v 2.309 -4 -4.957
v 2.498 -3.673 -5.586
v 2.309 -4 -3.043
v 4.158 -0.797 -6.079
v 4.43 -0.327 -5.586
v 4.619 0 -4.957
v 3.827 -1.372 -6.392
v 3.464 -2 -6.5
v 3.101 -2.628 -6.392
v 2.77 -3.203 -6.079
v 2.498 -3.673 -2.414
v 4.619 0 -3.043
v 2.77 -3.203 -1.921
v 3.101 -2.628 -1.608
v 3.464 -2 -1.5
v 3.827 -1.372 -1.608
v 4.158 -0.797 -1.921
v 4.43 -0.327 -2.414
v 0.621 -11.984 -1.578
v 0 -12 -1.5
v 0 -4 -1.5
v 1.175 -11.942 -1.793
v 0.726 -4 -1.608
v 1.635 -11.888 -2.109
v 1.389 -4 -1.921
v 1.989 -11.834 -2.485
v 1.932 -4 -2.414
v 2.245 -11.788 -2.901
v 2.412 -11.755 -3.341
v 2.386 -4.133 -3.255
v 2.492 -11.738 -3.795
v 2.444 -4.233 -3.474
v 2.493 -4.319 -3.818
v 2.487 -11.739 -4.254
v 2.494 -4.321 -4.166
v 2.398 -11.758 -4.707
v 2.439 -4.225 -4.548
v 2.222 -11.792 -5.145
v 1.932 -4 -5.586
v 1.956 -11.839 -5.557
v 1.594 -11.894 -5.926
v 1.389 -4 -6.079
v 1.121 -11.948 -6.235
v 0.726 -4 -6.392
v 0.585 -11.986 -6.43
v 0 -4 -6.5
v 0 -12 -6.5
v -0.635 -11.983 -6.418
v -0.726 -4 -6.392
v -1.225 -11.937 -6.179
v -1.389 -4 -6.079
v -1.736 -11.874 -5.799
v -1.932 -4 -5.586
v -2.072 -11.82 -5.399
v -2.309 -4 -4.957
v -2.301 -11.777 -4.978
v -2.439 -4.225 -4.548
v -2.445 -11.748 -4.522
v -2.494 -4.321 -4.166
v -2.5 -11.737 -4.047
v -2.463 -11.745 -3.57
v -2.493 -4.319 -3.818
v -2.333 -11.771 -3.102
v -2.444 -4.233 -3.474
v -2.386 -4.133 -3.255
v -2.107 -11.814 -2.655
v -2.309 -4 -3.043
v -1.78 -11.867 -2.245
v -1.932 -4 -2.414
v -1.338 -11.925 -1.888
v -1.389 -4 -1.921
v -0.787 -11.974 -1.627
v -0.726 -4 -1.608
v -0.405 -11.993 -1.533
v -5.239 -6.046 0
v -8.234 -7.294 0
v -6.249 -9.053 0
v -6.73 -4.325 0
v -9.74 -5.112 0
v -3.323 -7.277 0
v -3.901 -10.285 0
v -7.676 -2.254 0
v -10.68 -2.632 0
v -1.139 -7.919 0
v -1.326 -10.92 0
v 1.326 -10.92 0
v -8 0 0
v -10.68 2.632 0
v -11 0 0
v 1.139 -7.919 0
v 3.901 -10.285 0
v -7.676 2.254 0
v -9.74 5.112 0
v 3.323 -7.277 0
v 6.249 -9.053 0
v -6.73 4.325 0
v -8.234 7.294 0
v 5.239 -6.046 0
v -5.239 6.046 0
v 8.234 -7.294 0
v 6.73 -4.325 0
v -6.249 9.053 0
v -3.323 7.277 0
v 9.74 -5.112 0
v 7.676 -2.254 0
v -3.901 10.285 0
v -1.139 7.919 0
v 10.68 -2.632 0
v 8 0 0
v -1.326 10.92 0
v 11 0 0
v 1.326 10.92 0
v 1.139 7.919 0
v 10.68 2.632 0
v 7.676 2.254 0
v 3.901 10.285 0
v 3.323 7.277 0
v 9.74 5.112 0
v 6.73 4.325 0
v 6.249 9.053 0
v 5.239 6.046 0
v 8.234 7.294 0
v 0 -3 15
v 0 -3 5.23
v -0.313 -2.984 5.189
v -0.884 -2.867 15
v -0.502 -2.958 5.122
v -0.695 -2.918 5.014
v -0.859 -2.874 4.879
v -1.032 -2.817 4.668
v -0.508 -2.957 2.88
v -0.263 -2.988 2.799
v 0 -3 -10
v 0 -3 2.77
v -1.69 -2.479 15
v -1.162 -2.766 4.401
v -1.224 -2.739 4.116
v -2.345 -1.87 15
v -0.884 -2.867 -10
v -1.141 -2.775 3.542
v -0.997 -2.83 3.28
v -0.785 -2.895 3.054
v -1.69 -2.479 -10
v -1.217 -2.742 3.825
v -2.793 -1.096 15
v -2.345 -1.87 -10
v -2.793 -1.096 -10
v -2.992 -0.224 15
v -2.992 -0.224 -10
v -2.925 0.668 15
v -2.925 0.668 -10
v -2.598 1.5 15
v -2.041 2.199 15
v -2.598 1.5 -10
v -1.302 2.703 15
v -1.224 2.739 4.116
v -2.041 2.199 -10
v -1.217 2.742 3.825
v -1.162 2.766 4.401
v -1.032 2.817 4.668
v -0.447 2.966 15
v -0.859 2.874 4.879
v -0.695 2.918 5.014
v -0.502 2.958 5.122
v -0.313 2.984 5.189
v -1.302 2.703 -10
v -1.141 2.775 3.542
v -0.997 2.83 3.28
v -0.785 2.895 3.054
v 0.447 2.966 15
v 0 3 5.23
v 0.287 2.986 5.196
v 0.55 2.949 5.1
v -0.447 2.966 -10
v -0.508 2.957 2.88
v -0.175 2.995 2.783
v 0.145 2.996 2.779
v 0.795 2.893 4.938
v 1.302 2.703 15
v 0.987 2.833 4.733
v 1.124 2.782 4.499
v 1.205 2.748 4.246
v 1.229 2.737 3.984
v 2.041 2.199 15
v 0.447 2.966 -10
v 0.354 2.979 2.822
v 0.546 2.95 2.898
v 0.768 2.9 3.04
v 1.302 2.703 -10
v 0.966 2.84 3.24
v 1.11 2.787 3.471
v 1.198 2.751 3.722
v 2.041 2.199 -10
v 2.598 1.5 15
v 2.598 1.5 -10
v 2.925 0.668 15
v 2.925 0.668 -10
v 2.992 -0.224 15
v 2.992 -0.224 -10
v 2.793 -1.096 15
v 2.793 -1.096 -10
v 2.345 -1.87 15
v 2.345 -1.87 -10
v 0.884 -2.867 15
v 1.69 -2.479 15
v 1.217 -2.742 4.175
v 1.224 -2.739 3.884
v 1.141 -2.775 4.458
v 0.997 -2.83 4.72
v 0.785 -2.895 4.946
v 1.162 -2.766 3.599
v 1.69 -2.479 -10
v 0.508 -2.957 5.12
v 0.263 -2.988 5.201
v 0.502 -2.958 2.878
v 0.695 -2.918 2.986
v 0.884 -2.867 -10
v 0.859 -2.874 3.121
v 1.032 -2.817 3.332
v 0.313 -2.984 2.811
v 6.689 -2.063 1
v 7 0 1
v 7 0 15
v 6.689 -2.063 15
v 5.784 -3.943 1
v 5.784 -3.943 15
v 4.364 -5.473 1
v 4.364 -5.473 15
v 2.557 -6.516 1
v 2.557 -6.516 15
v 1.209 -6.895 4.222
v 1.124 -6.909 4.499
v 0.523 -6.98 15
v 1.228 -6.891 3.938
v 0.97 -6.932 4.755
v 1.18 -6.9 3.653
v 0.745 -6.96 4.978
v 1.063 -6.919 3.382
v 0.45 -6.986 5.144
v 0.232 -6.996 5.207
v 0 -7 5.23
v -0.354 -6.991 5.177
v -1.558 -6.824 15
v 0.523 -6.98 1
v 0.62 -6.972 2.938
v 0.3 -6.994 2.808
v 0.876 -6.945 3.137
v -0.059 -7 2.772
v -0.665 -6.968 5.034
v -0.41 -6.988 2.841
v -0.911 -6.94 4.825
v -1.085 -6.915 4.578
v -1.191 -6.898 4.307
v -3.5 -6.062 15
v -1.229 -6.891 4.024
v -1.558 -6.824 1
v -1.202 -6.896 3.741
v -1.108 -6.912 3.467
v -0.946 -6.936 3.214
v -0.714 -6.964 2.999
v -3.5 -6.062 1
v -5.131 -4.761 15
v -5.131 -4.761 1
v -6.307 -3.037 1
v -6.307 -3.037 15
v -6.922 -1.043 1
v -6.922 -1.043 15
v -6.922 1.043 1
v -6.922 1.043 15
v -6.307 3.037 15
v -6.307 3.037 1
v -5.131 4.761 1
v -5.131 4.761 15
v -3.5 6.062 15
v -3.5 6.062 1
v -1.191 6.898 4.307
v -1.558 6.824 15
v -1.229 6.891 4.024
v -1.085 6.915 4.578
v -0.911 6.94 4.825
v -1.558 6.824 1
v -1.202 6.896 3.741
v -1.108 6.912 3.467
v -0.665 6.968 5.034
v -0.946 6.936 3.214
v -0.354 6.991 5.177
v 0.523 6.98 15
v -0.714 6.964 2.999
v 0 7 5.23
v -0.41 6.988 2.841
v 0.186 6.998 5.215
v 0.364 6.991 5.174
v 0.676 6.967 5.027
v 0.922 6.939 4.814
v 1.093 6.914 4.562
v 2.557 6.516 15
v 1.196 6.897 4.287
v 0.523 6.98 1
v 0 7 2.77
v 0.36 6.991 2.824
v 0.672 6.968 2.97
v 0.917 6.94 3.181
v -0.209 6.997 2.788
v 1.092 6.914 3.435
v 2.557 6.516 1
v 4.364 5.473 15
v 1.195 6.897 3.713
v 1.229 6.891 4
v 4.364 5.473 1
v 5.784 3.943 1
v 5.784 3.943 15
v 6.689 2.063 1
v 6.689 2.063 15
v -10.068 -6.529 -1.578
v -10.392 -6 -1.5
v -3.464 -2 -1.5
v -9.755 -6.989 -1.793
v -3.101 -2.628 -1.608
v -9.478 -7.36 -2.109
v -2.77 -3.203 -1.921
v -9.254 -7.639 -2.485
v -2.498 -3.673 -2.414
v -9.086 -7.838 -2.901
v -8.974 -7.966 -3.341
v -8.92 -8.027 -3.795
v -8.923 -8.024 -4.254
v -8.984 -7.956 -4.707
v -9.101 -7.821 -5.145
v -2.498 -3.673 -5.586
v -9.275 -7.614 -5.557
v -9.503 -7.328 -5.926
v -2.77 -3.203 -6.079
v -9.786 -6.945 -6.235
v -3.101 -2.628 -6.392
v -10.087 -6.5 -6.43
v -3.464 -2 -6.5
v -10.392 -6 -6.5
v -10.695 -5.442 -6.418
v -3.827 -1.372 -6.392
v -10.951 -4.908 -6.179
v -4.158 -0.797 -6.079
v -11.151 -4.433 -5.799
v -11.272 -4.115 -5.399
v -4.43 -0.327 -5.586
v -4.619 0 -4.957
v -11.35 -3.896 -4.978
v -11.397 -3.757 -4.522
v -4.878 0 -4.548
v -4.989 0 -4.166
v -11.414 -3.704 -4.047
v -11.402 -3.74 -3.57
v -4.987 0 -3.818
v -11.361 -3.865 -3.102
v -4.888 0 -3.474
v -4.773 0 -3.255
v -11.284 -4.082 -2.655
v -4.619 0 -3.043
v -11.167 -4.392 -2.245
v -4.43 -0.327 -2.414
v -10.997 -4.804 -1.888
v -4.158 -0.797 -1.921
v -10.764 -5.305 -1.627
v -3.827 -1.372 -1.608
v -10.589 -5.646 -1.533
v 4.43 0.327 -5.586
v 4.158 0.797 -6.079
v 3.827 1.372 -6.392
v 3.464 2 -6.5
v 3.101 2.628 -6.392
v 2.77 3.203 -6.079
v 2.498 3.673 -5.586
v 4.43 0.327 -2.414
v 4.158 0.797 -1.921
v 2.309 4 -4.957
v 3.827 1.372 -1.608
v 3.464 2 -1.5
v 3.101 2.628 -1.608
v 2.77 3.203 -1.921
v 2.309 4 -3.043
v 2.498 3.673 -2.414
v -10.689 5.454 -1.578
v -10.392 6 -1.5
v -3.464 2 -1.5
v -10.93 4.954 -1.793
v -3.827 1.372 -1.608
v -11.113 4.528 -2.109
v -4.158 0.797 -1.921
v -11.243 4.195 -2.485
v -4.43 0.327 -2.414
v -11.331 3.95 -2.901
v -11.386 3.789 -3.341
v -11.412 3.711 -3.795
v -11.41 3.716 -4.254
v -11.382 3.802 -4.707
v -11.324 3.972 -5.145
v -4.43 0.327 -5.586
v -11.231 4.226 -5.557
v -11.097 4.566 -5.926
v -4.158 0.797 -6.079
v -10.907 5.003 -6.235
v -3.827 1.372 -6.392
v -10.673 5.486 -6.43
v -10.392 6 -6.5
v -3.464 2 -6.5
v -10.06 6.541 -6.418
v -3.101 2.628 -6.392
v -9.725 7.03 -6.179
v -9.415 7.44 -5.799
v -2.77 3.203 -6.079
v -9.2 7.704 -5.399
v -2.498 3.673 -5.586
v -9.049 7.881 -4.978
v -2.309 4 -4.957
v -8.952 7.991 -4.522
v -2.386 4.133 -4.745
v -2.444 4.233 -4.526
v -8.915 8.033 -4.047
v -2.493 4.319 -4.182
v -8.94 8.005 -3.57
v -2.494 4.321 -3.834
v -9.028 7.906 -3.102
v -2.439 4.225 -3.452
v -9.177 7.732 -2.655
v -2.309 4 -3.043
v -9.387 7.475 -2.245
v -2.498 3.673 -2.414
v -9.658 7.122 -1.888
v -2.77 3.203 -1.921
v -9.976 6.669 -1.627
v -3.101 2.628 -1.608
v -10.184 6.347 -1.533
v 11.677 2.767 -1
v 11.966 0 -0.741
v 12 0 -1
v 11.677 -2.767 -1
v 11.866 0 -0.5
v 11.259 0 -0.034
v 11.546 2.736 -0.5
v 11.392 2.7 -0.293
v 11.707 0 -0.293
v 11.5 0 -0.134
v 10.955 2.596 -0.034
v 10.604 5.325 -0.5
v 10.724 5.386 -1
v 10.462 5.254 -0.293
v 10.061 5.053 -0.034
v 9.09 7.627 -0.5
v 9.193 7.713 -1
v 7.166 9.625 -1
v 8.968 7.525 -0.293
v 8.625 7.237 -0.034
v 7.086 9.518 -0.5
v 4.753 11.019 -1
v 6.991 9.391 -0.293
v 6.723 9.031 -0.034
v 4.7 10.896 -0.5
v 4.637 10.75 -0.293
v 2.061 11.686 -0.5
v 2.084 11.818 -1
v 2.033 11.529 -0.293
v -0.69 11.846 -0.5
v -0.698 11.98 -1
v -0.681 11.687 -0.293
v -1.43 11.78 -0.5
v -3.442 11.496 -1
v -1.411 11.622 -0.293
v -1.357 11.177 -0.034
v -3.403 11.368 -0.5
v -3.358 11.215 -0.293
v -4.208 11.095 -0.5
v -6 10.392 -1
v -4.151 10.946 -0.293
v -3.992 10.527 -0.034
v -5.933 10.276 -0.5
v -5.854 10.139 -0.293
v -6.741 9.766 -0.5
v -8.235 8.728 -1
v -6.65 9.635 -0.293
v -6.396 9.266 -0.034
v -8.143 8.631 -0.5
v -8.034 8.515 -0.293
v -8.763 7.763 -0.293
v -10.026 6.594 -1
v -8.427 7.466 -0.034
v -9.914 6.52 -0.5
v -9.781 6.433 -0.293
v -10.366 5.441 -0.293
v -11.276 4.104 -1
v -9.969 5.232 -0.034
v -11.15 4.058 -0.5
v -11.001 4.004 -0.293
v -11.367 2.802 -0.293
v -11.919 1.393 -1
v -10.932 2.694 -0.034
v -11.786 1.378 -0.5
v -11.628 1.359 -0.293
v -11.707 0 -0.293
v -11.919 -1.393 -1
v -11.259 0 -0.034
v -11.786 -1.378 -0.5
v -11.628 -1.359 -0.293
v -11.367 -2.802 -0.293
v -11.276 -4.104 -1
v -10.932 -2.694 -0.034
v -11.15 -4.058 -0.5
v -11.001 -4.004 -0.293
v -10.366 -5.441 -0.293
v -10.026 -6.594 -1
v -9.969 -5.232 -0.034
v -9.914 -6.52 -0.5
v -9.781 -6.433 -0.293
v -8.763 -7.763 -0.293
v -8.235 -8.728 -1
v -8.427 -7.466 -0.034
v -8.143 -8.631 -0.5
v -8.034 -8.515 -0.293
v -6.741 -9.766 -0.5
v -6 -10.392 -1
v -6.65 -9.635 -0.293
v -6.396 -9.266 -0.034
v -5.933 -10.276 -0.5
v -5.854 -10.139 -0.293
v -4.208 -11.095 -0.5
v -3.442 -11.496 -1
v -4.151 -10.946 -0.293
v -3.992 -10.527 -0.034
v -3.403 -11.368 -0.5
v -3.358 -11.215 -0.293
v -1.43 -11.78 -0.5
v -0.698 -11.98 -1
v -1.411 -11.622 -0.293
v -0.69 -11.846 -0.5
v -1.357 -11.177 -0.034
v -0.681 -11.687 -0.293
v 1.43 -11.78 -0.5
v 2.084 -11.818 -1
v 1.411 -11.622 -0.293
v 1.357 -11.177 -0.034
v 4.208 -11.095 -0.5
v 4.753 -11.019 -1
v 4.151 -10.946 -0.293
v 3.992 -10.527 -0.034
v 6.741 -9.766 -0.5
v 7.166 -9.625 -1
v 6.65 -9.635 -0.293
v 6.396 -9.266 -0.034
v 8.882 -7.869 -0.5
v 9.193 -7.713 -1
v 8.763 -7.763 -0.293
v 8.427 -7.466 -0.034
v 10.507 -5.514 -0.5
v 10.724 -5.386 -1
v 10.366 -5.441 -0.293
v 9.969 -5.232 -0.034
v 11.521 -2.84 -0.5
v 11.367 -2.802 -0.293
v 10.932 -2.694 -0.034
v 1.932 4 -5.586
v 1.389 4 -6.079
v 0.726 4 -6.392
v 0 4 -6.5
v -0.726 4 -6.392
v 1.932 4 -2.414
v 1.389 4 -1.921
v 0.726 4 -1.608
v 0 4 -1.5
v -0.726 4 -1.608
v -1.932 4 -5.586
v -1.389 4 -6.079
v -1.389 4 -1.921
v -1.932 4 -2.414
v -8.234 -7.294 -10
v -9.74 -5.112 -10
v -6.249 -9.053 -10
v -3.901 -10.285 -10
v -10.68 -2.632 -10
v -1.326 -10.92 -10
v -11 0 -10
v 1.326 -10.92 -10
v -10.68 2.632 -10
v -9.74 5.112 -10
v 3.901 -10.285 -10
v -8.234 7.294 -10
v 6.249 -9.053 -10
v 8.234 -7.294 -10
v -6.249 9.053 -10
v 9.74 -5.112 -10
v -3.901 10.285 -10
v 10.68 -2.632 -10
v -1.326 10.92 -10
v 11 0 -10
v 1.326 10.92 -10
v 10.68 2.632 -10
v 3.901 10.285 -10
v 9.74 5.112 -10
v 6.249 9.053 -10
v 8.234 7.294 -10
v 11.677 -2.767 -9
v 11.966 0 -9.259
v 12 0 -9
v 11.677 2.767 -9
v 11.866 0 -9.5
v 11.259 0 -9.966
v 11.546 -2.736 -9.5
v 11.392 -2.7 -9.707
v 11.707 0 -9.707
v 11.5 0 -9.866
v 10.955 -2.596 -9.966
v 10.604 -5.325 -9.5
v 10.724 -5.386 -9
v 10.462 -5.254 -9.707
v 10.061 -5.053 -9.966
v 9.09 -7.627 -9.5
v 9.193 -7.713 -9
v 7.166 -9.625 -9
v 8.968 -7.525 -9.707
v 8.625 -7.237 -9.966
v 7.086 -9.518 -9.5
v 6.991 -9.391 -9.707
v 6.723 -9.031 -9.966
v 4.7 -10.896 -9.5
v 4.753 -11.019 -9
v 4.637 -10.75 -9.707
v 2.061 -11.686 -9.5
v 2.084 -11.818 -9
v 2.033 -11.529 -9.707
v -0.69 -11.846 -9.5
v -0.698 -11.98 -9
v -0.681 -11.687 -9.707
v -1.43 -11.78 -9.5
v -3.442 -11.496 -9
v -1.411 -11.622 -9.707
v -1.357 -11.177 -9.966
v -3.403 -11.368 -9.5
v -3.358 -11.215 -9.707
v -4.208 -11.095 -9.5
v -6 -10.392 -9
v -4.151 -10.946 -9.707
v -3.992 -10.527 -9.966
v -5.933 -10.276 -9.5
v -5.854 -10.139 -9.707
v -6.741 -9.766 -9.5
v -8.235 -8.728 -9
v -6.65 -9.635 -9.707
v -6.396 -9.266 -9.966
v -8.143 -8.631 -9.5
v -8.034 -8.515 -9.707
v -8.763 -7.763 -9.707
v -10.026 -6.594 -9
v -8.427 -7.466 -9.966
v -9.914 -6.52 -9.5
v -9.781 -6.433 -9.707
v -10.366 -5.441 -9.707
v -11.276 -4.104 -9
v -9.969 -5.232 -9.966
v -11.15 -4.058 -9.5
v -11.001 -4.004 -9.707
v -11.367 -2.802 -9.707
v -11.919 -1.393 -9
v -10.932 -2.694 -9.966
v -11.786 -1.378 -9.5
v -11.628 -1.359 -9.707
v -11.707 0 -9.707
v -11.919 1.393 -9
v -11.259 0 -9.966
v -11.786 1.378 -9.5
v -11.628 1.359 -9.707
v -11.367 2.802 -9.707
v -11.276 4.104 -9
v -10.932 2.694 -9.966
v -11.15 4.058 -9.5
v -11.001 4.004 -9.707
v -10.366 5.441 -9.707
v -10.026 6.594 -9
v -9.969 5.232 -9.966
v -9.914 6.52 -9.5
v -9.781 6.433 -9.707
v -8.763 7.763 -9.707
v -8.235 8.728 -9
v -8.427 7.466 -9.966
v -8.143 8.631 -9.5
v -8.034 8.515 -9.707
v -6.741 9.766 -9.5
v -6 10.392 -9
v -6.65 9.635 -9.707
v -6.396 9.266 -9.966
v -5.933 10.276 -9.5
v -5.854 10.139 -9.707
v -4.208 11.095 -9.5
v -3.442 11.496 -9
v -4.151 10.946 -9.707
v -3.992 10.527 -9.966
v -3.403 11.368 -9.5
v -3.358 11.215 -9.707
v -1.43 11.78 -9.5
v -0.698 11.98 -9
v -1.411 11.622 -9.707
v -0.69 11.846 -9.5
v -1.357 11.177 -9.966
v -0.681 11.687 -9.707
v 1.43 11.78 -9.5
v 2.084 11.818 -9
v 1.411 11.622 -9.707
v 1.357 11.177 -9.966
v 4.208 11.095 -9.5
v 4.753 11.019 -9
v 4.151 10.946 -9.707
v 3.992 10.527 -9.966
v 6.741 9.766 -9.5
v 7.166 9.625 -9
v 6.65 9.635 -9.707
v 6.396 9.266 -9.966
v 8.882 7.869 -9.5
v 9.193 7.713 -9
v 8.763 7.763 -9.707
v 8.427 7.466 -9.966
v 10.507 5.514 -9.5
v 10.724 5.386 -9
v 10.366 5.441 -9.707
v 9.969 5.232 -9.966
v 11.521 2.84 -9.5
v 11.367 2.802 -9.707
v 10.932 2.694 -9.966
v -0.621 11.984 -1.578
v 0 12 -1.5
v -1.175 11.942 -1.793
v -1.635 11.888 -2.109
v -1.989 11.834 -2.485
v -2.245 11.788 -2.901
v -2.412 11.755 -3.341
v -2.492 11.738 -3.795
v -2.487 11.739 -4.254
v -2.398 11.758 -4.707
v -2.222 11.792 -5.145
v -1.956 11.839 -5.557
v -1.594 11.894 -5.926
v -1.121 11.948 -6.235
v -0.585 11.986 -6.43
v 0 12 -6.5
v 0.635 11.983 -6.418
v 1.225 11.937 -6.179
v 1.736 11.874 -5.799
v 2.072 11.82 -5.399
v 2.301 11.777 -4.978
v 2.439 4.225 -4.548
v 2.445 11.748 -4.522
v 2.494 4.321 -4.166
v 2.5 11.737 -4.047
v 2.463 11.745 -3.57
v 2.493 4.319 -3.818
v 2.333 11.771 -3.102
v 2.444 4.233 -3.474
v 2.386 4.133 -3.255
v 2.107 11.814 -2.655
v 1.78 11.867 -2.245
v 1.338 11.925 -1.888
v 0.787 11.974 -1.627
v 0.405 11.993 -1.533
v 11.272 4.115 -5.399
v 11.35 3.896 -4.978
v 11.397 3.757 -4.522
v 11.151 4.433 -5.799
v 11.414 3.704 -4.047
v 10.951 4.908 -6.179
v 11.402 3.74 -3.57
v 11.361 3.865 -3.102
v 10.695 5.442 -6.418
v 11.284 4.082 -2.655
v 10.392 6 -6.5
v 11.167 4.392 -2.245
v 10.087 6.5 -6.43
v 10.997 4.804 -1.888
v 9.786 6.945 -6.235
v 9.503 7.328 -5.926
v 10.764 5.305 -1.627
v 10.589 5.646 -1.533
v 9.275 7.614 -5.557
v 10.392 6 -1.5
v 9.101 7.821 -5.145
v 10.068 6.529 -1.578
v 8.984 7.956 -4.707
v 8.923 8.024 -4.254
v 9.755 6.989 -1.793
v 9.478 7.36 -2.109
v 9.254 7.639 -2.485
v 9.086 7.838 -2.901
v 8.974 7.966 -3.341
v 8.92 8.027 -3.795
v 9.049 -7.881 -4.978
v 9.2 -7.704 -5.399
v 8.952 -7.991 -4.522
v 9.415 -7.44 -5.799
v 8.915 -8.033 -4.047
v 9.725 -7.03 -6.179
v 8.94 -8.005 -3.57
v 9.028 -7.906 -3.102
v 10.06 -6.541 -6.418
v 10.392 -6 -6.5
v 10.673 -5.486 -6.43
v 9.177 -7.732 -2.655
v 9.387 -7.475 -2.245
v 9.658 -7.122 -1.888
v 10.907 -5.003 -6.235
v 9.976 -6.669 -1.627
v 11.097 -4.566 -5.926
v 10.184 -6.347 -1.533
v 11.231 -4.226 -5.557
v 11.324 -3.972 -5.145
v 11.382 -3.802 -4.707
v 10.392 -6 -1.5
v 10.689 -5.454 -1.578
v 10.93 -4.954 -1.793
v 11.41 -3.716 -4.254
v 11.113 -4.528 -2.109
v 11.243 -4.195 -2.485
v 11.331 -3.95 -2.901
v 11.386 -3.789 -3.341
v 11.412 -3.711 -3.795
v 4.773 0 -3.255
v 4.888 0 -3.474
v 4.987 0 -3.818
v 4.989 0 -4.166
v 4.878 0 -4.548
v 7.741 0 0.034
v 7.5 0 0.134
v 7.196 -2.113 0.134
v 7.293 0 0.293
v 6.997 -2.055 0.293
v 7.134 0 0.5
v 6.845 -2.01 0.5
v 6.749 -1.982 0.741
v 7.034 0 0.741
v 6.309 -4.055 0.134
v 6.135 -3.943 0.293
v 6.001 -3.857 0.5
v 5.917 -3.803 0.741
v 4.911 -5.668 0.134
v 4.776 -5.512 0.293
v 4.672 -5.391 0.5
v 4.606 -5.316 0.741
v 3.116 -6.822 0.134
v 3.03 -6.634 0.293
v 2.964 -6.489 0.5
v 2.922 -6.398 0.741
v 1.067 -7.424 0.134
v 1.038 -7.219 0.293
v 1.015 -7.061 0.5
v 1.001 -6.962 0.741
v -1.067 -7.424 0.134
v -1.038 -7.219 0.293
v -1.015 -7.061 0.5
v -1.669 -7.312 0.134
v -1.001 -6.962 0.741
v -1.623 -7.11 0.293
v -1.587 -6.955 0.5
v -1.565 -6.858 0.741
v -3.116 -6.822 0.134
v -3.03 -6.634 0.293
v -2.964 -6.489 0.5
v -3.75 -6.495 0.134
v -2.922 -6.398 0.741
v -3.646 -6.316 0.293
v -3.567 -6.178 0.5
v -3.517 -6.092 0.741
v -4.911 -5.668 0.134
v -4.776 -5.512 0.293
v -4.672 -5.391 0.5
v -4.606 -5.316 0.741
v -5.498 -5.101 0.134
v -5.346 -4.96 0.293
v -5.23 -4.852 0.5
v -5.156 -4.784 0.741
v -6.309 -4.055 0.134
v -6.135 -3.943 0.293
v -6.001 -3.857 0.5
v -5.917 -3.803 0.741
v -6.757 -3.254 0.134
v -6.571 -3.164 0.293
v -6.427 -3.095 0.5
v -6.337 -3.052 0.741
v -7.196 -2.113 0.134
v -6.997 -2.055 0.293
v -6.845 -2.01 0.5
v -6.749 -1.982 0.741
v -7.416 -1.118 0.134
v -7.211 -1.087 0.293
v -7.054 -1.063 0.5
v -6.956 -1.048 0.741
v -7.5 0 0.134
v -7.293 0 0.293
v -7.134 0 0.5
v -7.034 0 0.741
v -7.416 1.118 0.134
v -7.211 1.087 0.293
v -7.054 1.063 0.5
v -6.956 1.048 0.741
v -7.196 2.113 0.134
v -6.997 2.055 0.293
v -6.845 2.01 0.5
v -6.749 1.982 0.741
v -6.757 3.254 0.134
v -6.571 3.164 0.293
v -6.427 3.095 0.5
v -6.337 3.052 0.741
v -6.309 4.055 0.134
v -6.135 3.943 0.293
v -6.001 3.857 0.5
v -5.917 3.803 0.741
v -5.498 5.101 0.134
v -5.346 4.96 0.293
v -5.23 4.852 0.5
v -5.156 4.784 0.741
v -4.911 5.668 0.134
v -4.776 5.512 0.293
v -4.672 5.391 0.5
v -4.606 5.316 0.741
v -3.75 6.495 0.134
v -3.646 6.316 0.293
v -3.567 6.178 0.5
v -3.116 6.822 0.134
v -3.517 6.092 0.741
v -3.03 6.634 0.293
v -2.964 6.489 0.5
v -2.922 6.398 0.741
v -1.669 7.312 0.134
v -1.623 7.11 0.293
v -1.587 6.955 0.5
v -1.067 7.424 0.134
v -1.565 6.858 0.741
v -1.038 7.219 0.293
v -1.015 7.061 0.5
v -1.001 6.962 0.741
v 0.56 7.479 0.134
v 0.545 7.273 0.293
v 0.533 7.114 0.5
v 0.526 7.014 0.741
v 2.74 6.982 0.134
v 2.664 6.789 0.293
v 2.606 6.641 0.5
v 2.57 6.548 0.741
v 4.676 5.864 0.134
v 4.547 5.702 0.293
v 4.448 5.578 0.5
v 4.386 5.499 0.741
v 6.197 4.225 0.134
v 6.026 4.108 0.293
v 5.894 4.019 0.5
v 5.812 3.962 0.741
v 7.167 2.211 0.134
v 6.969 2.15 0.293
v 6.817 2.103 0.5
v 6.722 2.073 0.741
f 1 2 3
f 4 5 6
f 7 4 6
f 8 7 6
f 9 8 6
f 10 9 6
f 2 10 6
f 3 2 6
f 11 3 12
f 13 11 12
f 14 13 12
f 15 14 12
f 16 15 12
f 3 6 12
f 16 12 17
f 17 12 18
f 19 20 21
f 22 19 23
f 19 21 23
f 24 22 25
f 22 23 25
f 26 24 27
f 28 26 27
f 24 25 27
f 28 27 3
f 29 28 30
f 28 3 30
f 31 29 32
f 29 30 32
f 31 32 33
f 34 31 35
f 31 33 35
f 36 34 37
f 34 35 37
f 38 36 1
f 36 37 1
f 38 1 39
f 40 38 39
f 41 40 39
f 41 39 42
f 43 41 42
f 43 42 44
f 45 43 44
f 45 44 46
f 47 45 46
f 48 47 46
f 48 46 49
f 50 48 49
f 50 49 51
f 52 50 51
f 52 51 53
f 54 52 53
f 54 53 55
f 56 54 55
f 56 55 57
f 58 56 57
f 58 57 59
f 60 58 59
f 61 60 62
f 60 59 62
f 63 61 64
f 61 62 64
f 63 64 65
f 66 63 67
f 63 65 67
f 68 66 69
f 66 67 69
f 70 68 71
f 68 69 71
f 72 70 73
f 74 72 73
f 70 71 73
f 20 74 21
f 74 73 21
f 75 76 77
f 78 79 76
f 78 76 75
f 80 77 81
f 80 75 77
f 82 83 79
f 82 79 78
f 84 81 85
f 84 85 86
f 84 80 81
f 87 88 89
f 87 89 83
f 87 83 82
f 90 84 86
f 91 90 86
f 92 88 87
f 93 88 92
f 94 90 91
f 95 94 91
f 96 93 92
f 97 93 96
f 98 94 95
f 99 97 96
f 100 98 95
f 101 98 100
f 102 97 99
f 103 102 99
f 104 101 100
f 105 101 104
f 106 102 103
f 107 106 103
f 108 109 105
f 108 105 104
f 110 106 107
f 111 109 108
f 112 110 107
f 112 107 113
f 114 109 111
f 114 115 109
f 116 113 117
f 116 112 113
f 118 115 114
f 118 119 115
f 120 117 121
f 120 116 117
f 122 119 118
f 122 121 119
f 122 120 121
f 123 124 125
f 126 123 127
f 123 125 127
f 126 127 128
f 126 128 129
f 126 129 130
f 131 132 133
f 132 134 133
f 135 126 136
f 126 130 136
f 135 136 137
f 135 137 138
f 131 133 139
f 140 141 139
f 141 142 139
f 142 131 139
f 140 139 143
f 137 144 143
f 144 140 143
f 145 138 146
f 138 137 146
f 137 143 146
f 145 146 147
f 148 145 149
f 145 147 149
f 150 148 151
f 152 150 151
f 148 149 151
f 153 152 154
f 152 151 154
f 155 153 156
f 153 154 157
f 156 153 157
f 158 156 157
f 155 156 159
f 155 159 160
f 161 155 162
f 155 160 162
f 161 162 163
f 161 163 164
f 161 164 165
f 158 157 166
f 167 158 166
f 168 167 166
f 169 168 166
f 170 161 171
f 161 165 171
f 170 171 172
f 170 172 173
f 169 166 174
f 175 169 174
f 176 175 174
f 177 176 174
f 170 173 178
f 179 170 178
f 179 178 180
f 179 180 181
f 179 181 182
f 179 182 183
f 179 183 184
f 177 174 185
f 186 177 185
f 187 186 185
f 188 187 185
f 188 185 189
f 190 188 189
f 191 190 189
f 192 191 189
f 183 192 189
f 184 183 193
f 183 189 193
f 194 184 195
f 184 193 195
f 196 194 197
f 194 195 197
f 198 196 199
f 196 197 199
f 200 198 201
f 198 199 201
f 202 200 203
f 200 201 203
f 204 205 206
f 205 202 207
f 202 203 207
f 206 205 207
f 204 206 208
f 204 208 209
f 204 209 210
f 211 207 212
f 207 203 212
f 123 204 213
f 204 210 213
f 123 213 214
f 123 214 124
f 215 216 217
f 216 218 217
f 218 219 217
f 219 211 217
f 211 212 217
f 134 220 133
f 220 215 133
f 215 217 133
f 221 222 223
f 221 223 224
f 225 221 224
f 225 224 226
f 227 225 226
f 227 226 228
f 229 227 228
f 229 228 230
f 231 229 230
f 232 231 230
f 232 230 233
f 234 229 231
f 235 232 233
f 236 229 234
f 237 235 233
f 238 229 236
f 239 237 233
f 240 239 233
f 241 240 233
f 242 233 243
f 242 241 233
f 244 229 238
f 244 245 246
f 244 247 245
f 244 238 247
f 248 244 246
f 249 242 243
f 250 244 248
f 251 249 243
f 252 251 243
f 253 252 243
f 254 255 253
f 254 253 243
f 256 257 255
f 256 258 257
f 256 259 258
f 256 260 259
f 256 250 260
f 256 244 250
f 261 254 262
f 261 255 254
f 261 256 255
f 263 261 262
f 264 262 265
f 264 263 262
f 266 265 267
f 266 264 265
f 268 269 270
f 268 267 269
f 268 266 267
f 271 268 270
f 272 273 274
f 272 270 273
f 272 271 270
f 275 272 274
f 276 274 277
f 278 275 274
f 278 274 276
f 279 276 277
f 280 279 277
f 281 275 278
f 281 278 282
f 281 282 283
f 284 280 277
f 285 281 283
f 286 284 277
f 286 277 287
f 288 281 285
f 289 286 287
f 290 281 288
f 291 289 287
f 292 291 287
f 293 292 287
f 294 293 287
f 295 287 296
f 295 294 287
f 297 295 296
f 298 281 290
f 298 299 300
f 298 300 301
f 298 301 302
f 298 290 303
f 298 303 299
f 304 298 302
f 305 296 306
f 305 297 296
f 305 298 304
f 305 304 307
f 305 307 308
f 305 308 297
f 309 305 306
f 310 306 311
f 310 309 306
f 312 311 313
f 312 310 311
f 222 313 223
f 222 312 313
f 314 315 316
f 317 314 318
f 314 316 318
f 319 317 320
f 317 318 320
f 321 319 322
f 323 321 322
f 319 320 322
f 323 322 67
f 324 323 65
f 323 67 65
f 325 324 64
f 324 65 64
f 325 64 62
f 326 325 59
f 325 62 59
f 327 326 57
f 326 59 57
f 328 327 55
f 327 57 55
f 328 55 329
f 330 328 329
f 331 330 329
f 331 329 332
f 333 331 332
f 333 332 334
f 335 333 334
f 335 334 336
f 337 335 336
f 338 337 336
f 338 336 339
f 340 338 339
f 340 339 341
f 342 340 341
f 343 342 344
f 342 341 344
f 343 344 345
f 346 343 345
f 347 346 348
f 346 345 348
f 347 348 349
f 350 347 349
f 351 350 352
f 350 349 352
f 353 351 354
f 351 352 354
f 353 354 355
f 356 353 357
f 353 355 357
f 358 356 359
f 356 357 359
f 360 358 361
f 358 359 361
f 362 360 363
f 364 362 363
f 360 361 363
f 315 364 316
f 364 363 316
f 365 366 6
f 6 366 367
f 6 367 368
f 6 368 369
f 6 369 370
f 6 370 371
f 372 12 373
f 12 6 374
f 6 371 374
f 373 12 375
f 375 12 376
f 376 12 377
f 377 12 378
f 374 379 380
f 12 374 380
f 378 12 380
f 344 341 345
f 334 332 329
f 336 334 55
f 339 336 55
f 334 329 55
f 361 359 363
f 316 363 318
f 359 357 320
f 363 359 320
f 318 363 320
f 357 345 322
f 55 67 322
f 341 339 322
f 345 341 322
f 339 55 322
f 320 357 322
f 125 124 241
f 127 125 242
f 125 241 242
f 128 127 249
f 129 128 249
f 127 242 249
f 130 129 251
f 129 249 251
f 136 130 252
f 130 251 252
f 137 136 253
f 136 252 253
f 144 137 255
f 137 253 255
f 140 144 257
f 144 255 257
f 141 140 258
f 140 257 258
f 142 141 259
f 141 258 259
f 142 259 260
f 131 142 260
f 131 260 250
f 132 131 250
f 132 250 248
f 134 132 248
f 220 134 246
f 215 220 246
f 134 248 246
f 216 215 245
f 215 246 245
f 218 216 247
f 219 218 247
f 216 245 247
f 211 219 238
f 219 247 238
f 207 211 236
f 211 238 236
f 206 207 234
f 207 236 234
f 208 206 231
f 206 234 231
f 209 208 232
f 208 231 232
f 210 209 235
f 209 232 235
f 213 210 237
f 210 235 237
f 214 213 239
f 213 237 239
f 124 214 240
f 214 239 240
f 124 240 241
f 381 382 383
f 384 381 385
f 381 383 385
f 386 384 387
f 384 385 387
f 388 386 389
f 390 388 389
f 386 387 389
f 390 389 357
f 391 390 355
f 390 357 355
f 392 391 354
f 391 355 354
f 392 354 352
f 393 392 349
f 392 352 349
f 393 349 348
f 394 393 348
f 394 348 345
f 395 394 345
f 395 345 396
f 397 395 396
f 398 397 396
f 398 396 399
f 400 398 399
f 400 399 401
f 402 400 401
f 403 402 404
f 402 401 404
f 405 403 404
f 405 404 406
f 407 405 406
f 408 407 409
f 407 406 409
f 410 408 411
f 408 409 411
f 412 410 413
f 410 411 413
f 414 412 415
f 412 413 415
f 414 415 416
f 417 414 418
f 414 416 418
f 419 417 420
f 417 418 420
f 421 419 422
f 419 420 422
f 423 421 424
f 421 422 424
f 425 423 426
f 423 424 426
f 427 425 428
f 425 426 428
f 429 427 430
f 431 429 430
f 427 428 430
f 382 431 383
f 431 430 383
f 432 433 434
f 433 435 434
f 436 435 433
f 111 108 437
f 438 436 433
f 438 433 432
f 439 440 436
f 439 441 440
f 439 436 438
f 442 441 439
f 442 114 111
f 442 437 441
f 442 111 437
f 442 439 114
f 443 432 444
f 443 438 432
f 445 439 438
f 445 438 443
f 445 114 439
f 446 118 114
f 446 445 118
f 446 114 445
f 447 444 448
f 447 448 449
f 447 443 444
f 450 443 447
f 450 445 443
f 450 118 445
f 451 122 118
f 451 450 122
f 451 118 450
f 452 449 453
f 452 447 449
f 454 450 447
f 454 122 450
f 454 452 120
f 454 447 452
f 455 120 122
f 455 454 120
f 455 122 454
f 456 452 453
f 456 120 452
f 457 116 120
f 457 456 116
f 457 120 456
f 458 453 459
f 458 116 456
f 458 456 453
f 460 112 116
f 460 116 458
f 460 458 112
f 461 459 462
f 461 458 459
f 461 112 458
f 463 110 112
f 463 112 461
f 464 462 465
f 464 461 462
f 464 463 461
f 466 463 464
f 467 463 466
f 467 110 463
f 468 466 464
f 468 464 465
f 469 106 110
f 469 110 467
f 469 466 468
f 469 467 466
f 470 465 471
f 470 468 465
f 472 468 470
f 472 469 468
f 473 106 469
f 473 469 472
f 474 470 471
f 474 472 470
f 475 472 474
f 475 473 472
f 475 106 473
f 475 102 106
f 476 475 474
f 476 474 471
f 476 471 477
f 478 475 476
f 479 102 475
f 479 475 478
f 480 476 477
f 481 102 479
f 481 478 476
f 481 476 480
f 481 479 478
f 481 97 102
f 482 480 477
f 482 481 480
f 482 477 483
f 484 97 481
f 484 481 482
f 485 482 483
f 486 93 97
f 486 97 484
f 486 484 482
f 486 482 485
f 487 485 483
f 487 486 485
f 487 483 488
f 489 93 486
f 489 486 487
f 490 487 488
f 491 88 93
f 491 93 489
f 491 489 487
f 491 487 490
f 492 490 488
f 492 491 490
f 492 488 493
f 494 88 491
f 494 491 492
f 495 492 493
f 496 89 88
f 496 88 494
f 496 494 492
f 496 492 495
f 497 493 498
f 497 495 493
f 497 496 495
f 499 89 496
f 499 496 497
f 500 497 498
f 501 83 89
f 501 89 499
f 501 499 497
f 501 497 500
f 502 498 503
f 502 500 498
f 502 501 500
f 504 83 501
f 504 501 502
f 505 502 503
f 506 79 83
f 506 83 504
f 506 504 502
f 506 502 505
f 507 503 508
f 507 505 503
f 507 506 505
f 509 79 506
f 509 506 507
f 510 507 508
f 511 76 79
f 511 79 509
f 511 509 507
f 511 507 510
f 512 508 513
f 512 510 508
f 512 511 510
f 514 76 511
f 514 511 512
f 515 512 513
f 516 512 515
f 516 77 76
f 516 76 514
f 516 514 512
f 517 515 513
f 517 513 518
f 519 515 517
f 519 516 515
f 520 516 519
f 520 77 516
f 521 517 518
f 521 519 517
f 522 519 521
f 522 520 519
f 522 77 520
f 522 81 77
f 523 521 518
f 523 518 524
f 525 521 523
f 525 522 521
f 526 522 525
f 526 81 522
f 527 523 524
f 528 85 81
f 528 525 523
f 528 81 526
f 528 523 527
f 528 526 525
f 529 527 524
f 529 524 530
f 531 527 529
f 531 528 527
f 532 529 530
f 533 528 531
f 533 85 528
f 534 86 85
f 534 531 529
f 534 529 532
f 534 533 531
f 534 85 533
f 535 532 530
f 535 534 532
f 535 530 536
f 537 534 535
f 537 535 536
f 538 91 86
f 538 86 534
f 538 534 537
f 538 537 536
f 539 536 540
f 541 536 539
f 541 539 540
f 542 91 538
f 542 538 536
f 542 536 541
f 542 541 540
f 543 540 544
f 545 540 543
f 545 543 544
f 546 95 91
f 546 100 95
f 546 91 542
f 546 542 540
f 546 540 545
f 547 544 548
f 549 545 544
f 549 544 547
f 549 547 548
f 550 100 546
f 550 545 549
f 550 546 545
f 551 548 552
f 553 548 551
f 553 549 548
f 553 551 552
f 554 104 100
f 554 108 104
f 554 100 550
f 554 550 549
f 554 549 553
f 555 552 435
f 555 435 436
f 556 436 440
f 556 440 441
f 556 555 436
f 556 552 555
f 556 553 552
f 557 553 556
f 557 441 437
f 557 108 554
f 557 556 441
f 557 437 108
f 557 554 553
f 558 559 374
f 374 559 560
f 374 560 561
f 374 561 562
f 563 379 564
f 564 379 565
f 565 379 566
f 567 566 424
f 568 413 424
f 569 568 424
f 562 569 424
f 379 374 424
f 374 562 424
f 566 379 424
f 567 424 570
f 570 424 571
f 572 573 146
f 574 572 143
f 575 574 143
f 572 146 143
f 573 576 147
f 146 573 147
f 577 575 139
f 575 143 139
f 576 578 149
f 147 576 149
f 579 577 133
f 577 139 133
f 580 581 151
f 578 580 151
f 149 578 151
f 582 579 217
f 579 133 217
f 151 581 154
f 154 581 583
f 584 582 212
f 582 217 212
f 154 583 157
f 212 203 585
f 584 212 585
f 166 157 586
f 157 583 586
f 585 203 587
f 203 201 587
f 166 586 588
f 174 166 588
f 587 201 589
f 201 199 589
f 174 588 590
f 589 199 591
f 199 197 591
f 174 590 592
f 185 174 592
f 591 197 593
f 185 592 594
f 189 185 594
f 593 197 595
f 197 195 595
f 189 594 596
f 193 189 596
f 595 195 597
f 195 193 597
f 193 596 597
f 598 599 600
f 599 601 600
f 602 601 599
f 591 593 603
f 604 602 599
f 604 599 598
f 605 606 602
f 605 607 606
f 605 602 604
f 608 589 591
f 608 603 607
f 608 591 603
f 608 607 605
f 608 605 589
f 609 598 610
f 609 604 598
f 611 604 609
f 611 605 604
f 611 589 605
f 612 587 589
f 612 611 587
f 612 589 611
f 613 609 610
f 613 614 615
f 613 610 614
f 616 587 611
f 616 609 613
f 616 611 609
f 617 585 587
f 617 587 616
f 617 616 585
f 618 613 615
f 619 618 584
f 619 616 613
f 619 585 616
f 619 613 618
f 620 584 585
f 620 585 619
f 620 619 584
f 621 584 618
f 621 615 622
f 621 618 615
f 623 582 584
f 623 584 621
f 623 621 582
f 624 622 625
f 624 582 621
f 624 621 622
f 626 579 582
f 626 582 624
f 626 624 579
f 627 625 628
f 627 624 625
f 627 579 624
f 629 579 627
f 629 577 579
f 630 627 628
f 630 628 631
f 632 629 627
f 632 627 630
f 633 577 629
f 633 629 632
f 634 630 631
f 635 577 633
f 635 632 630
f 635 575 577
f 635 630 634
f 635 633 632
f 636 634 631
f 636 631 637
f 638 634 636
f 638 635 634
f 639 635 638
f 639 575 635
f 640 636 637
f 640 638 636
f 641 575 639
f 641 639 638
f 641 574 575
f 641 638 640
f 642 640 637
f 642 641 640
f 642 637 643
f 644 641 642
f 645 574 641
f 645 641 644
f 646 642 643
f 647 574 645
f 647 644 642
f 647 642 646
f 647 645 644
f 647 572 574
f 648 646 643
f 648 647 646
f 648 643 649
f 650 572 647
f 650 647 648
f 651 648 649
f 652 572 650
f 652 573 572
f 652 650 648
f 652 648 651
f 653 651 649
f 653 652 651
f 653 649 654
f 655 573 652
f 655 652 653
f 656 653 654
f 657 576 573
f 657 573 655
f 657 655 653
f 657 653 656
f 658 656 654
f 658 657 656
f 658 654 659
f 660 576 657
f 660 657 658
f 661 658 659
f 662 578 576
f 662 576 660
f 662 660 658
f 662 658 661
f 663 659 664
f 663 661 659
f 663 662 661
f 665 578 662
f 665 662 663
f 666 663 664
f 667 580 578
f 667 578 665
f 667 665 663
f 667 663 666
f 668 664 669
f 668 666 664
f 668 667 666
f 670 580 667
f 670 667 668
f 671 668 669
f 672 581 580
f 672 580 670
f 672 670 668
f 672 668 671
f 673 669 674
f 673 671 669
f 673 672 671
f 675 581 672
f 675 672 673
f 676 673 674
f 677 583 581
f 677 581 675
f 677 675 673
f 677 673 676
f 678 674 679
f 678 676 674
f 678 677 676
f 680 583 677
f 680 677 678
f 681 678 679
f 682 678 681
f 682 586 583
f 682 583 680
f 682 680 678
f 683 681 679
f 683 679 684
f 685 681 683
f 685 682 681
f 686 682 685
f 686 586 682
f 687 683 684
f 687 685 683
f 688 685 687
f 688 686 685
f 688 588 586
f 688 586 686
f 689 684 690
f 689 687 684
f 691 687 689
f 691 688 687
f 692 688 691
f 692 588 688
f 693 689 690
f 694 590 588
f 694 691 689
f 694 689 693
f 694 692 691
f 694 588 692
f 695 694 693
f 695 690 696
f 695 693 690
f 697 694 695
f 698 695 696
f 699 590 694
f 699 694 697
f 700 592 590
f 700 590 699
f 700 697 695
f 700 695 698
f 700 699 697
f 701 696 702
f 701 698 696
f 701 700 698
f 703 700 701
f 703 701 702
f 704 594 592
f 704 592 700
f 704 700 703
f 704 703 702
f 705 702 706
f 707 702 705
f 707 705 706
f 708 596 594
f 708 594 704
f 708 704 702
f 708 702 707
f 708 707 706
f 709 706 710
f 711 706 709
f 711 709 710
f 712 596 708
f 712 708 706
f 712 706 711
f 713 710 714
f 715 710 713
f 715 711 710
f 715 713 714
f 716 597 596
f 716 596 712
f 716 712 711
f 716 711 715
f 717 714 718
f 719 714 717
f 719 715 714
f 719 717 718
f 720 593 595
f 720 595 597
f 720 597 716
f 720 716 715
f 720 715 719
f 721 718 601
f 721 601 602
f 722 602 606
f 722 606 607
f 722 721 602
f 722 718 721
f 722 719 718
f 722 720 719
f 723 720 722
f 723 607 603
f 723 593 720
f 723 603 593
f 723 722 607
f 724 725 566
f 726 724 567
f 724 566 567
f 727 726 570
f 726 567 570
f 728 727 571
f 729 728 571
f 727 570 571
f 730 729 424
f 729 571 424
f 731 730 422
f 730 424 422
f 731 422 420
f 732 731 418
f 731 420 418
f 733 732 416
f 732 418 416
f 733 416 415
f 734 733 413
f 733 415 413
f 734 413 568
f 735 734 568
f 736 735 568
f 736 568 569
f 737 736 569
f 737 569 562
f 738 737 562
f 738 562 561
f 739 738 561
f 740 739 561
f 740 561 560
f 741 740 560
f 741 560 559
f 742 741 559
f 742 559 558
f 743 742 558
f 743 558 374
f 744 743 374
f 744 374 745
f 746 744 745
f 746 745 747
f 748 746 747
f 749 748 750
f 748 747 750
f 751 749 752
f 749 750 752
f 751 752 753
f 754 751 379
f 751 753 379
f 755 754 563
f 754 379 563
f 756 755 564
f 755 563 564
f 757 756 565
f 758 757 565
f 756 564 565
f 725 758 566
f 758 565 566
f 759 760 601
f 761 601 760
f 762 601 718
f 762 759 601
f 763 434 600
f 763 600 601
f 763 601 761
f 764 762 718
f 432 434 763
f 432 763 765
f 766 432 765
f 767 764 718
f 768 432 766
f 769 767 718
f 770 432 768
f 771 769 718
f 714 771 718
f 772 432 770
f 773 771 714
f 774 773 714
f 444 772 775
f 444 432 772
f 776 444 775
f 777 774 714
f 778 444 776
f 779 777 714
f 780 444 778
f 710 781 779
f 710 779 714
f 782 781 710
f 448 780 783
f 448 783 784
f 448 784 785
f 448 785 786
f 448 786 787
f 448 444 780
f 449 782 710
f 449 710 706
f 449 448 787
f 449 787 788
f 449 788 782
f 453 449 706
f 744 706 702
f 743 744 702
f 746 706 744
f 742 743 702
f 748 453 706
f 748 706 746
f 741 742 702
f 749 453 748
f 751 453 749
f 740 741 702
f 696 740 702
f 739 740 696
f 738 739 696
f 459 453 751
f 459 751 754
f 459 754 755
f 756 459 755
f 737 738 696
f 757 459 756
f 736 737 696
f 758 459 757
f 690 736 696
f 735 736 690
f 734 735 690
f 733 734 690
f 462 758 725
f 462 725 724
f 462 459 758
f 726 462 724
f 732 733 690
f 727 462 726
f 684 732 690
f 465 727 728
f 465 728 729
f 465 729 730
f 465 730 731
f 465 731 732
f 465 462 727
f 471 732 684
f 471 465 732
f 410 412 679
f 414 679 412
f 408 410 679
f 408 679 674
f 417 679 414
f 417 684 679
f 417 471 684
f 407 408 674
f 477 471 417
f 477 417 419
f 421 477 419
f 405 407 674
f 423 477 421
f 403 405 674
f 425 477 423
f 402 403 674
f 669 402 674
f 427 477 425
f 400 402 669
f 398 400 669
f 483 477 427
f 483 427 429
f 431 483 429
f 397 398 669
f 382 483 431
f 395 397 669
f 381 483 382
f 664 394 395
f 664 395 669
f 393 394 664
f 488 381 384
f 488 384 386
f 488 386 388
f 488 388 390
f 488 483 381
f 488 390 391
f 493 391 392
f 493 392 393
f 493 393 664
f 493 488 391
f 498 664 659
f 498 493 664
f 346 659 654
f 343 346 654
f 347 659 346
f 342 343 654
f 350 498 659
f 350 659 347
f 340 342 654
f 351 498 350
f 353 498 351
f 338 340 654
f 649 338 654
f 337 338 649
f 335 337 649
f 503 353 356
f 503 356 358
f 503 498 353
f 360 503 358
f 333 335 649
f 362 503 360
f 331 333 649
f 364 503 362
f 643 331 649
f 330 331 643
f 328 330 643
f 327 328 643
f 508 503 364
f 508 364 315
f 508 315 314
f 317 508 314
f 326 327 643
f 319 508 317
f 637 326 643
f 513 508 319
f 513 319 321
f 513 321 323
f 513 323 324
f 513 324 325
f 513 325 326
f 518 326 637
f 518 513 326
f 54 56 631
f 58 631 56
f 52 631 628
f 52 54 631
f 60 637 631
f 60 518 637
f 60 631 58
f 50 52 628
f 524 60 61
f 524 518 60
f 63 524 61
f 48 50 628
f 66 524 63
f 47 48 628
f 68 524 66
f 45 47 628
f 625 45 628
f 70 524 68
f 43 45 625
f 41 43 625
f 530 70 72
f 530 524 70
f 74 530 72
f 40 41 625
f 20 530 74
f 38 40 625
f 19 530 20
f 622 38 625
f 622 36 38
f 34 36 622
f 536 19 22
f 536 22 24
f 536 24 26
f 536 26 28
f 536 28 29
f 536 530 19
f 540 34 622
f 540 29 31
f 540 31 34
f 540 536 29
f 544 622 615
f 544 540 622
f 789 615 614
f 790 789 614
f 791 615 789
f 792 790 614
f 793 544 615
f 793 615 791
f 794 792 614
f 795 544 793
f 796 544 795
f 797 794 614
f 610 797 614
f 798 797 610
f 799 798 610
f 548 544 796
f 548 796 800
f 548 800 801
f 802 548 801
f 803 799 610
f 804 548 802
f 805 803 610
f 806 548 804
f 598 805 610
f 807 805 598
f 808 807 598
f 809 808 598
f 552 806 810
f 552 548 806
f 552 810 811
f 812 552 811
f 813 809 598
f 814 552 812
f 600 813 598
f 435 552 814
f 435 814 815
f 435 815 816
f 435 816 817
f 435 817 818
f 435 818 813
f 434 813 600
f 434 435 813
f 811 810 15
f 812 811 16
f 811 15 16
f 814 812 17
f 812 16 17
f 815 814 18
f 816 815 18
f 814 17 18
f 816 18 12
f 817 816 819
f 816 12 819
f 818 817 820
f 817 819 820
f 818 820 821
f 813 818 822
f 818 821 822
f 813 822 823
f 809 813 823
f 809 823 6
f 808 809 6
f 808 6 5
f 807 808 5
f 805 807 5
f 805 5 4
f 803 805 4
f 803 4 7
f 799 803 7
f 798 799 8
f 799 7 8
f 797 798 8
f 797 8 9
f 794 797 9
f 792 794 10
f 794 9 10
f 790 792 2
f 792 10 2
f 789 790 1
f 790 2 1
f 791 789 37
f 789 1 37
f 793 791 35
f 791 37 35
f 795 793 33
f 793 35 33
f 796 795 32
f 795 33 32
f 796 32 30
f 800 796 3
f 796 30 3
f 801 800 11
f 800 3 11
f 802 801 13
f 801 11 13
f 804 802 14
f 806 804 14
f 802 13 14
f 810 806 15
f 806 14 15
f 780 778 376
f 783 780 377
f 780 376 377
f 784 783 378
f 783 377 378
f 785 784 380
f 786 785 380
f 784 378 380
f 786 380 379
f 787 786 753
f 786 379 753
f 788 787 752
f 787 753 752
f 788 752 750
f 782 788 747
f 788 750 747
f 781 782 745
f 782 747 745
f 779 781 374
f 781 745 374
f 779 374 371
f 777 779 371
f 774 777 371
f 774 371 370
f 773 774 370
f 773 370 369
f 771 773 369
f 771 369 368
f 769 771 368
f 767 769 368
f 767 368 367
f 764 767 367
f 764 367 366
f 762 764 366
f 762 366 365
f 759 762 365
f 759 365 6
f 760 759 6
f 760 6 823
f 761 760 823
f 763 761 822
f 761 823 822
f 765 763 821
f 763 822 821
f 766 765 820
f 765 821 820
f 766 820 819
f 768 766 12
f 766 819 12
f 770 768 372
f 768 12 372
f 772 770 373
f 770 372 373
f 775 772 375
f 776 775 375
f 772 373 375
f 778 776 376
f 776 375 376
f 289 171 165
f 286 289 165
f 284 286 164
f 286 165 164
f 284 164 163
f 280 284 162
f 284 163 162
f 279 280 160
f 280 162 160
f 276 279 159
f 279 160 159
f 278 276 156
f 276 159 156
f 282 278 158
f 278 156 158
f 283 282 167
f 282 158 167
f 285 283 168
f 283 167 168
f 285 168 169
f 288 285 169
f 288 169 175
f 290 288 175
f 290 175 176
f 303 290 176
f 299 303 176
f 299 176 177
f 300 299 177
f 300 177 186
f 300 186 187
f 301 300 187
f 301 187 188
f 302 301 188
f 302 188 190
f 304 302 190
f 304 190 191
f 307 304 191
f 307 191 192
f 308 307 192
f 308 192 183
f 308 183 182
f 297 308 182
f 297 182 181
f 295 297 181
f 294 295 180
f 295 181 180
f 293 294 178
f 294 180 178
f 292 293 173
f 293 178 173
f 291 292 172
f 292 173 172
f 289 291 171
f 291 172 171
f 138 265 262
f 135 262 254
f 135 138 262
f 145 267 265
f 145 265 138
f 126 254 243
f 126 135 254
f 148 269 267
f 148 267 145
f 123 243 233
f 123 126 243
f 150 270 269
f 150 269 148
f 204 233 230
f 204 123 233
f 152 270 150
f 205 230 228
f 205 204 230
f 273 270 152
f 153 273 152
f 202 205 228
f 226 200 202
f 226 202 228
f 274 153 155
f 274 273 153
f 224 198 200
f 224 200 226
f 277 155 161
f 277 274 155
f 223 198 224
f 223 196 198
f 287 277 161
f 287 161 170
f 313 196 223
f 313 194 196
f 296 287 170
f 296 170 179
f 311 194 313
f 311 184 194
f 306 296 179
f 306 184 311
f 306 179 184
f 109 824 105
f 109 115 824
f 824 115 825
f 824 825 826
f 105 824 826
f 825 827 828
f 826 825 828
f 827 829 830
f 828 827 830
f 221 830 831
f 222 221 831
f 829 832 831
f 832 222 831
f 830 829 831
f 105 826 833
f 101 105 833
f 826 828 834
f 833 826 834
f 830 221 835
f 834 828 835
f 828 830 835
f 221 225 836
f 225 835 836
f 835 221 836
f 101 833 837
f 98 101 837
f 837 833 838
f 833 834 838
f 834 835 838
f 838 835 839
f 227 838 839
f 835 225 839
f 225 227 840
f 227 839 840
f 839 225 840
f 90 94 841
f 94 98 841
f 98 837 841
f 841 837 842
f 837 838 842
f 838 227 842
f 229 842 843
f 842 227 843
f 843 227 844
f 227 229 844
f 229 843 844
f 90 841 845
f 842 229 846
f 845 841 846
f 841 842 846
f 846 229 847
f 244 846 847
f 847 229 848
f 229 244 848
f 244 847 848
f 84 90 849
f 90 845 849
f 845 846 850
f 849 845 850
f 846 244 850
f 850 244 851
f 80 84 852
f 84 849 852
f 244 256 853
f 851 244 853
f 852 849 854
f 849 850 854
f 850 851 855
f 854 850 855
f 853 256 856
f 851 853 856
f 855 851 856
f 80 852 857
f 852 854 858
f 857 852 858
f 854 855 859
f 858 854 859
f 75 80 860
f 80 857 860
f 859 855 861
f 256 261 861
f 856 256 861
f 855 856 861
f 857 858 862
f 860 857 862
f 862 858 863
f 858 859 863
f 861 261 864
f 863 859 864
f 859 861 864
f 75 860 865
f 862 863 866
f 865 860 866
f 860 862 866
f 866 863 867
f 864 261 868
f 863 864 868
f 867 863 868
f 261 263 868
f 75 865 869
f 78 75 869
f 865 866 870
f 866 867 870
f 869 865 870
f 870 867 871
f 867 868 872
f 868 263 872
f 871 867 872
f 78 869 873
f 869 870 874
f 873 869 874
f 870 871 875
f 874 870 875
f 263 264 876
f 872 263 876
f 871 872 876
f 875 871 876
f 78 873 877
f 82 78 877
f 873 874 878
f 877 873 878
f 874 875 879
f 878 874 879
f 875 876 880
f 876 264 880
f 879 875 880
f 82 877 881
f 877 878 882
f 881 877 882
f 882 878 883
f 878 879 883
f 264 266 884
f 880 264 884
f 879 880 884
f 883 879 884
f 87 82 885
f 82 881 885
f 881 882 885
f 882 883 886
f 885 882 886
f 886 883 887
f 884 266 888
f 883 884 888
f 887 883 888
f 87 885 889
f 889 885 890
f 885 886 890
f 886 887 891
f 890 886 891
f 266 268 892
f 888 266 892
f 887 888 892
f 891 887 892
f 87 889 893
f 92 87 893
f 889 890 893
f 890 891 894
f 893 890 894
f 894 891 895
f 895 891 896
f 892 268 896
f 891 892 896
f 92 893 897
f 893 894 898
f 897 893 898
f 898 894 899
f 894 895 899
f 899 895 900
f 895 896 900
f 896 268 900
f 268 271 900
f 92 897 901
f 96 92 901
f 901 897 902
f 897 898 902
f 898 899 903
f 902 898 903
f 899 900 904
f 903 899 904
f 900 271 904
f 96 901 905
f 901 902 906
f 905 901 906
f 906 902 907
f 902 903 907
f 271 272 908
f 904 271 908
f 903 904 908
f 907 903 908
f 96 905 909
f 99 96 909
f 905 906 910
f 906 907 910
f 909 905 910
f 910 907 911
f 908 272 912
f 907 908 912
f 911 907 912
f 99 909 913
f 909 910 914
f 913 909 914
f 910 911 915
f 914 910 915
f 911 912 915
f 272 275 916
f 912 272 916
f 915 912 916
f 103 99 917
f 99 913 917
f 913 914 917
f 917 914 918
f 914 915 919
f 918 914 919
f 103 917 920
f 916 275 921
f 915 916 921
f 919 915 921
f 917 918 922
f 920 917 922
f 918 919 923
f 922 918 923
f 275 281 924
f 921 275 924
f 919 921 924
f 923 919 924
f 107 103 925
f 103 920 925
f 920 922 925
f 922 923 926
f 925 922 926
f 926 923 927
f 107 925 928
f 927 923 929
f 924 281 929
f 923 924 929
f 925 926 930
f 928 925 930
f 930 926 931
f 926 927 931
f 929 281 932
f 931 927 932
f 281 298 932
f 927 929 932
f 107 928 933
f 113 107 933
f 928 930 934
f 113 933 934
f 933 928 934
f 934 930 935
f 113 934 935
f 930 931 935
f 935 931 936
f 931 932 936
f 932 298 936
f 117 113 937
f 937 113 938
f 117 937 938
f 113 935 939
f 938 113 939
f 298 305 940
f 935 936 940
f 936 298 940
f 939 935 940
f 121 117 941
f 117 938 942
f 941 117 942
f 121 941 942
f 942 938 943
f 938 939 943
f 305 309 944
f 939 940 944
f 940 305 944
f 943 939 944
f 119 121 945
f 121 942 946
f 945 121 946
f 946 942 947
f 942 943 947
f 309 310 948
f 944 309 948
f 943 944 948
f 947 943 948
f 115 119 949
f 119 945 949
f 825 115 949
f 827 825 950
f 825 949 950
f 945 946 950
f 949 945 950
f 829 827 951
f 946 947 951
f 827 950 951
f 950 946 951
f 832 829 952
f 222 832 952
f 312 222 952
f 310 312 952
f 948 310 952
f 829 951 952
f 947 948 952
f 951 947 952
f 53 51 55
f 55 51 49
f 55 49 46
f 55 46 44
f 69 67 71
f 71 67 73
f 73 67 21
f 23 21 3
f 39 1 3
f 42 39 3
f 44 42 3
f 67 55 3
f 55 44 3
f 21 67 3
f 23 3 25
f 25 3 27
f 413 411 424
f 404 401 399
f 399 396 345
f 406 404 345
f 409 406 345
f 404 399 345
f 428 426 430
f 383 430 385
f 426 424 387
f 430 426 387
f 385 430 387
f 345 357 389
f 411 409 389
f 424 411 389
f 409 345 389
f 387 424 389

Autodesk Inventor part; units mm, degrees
ref_plane "YZ Plane" through (0, 0, 0) normal (1, 0, 0) x (0, 1, 0)
sketch "Sketch1" plane through (0, 0, 0) normal (0, 0, 1) x (1, 0, 0)
  circle A0 centre (0, 0) radius 12
  dimension "d0" = 24
extrude "Extrusion1" add sketch "Sketch1" against normal blind 10
sketch "Sketch2" plane through (0, 0, 0) normal (0, 0, 1) x (1, 0, 0)
  circle A0 centre (0, 0) radius 7
  dimension "d3" = 14
extrude "Extrusion2" add sketch "Sketch2" along normal blind 15
fillet "Fillet1" radius 1 3 edges at (-7, 0, 0) (-12, 0, 0) (-12, 0, -10)
ref_plane "Work Plane1" through (0, 12, 0) normal (0, 1, 0) x (-1, 0, 0)
sketch "Sketch4" plane through (0, 12, 0) normal (0, 1, 0) x (-1, 0, 0)
  line L0 (11, -10) -> (-11, -10) projected
  point P0 (0, 0)
  point P1 (0, -4)
  dimension "d15" = 6
hole "Hole2" at (0, 12, -4) direction (0, -1, 0) diameter 5 depth 8
pattern_circular "Circular Pattern1" count 6 over 360 about axis through (0, 0, -9) along (0, 0, -1) of "Hole2"
ref_plane "Work Plane2" through (0, 7, 0) normal (0, 1, 0) x (-1, 0, 0)
sketch "Sketch5" plane through (0, 7, 0) normal (0, 1, 0) x (-1, 0, 0)
  line L0 (7, 15) -> (-7, 15) projected
  line L1 (2.3094, -4.9574) -> (2.3094, -3.0426) projected
  arc A0 (2.3094, -3.0426) -> (-2.3094, -3.0426) centre (0, -4) ccw projected
  line L2 (-2.3094, -3.0426) -> (-2.3094, -4.9574) projected
  arc A1 (-2.3094, -4.9574) -> (2.3094, -4.9574) centre (0, -4) ccw projected
  point P0 (0, 0)
  point P1 (0, 4)
  point P2 (0, -6.5)
  point P3 (0, -1.5)
  point P4 (0, -3.5)
  point P5 (0, -8.5)
  point P6 (0, -2.5)
  point P7 (0, -7.5)
  dimension "d27" = 11
hole "Hole3" at (0, 7, 4) direction (0, -1, 0) diameter 2.459 end through all thread size "M3x0.5" class "6H" standard "ISO Metric profile"
sketch "Sketch6" plane through (0, 0, 15) normal (0, 0, 1) x (1, 0, 0)
  circle A0 centre (0, 0) radius 7 projected
hole "Hole4" at (0, 0, 15) direction (0, 0, -1) diameter 6 depth 25
properties part number "22.4" material "Lead"
